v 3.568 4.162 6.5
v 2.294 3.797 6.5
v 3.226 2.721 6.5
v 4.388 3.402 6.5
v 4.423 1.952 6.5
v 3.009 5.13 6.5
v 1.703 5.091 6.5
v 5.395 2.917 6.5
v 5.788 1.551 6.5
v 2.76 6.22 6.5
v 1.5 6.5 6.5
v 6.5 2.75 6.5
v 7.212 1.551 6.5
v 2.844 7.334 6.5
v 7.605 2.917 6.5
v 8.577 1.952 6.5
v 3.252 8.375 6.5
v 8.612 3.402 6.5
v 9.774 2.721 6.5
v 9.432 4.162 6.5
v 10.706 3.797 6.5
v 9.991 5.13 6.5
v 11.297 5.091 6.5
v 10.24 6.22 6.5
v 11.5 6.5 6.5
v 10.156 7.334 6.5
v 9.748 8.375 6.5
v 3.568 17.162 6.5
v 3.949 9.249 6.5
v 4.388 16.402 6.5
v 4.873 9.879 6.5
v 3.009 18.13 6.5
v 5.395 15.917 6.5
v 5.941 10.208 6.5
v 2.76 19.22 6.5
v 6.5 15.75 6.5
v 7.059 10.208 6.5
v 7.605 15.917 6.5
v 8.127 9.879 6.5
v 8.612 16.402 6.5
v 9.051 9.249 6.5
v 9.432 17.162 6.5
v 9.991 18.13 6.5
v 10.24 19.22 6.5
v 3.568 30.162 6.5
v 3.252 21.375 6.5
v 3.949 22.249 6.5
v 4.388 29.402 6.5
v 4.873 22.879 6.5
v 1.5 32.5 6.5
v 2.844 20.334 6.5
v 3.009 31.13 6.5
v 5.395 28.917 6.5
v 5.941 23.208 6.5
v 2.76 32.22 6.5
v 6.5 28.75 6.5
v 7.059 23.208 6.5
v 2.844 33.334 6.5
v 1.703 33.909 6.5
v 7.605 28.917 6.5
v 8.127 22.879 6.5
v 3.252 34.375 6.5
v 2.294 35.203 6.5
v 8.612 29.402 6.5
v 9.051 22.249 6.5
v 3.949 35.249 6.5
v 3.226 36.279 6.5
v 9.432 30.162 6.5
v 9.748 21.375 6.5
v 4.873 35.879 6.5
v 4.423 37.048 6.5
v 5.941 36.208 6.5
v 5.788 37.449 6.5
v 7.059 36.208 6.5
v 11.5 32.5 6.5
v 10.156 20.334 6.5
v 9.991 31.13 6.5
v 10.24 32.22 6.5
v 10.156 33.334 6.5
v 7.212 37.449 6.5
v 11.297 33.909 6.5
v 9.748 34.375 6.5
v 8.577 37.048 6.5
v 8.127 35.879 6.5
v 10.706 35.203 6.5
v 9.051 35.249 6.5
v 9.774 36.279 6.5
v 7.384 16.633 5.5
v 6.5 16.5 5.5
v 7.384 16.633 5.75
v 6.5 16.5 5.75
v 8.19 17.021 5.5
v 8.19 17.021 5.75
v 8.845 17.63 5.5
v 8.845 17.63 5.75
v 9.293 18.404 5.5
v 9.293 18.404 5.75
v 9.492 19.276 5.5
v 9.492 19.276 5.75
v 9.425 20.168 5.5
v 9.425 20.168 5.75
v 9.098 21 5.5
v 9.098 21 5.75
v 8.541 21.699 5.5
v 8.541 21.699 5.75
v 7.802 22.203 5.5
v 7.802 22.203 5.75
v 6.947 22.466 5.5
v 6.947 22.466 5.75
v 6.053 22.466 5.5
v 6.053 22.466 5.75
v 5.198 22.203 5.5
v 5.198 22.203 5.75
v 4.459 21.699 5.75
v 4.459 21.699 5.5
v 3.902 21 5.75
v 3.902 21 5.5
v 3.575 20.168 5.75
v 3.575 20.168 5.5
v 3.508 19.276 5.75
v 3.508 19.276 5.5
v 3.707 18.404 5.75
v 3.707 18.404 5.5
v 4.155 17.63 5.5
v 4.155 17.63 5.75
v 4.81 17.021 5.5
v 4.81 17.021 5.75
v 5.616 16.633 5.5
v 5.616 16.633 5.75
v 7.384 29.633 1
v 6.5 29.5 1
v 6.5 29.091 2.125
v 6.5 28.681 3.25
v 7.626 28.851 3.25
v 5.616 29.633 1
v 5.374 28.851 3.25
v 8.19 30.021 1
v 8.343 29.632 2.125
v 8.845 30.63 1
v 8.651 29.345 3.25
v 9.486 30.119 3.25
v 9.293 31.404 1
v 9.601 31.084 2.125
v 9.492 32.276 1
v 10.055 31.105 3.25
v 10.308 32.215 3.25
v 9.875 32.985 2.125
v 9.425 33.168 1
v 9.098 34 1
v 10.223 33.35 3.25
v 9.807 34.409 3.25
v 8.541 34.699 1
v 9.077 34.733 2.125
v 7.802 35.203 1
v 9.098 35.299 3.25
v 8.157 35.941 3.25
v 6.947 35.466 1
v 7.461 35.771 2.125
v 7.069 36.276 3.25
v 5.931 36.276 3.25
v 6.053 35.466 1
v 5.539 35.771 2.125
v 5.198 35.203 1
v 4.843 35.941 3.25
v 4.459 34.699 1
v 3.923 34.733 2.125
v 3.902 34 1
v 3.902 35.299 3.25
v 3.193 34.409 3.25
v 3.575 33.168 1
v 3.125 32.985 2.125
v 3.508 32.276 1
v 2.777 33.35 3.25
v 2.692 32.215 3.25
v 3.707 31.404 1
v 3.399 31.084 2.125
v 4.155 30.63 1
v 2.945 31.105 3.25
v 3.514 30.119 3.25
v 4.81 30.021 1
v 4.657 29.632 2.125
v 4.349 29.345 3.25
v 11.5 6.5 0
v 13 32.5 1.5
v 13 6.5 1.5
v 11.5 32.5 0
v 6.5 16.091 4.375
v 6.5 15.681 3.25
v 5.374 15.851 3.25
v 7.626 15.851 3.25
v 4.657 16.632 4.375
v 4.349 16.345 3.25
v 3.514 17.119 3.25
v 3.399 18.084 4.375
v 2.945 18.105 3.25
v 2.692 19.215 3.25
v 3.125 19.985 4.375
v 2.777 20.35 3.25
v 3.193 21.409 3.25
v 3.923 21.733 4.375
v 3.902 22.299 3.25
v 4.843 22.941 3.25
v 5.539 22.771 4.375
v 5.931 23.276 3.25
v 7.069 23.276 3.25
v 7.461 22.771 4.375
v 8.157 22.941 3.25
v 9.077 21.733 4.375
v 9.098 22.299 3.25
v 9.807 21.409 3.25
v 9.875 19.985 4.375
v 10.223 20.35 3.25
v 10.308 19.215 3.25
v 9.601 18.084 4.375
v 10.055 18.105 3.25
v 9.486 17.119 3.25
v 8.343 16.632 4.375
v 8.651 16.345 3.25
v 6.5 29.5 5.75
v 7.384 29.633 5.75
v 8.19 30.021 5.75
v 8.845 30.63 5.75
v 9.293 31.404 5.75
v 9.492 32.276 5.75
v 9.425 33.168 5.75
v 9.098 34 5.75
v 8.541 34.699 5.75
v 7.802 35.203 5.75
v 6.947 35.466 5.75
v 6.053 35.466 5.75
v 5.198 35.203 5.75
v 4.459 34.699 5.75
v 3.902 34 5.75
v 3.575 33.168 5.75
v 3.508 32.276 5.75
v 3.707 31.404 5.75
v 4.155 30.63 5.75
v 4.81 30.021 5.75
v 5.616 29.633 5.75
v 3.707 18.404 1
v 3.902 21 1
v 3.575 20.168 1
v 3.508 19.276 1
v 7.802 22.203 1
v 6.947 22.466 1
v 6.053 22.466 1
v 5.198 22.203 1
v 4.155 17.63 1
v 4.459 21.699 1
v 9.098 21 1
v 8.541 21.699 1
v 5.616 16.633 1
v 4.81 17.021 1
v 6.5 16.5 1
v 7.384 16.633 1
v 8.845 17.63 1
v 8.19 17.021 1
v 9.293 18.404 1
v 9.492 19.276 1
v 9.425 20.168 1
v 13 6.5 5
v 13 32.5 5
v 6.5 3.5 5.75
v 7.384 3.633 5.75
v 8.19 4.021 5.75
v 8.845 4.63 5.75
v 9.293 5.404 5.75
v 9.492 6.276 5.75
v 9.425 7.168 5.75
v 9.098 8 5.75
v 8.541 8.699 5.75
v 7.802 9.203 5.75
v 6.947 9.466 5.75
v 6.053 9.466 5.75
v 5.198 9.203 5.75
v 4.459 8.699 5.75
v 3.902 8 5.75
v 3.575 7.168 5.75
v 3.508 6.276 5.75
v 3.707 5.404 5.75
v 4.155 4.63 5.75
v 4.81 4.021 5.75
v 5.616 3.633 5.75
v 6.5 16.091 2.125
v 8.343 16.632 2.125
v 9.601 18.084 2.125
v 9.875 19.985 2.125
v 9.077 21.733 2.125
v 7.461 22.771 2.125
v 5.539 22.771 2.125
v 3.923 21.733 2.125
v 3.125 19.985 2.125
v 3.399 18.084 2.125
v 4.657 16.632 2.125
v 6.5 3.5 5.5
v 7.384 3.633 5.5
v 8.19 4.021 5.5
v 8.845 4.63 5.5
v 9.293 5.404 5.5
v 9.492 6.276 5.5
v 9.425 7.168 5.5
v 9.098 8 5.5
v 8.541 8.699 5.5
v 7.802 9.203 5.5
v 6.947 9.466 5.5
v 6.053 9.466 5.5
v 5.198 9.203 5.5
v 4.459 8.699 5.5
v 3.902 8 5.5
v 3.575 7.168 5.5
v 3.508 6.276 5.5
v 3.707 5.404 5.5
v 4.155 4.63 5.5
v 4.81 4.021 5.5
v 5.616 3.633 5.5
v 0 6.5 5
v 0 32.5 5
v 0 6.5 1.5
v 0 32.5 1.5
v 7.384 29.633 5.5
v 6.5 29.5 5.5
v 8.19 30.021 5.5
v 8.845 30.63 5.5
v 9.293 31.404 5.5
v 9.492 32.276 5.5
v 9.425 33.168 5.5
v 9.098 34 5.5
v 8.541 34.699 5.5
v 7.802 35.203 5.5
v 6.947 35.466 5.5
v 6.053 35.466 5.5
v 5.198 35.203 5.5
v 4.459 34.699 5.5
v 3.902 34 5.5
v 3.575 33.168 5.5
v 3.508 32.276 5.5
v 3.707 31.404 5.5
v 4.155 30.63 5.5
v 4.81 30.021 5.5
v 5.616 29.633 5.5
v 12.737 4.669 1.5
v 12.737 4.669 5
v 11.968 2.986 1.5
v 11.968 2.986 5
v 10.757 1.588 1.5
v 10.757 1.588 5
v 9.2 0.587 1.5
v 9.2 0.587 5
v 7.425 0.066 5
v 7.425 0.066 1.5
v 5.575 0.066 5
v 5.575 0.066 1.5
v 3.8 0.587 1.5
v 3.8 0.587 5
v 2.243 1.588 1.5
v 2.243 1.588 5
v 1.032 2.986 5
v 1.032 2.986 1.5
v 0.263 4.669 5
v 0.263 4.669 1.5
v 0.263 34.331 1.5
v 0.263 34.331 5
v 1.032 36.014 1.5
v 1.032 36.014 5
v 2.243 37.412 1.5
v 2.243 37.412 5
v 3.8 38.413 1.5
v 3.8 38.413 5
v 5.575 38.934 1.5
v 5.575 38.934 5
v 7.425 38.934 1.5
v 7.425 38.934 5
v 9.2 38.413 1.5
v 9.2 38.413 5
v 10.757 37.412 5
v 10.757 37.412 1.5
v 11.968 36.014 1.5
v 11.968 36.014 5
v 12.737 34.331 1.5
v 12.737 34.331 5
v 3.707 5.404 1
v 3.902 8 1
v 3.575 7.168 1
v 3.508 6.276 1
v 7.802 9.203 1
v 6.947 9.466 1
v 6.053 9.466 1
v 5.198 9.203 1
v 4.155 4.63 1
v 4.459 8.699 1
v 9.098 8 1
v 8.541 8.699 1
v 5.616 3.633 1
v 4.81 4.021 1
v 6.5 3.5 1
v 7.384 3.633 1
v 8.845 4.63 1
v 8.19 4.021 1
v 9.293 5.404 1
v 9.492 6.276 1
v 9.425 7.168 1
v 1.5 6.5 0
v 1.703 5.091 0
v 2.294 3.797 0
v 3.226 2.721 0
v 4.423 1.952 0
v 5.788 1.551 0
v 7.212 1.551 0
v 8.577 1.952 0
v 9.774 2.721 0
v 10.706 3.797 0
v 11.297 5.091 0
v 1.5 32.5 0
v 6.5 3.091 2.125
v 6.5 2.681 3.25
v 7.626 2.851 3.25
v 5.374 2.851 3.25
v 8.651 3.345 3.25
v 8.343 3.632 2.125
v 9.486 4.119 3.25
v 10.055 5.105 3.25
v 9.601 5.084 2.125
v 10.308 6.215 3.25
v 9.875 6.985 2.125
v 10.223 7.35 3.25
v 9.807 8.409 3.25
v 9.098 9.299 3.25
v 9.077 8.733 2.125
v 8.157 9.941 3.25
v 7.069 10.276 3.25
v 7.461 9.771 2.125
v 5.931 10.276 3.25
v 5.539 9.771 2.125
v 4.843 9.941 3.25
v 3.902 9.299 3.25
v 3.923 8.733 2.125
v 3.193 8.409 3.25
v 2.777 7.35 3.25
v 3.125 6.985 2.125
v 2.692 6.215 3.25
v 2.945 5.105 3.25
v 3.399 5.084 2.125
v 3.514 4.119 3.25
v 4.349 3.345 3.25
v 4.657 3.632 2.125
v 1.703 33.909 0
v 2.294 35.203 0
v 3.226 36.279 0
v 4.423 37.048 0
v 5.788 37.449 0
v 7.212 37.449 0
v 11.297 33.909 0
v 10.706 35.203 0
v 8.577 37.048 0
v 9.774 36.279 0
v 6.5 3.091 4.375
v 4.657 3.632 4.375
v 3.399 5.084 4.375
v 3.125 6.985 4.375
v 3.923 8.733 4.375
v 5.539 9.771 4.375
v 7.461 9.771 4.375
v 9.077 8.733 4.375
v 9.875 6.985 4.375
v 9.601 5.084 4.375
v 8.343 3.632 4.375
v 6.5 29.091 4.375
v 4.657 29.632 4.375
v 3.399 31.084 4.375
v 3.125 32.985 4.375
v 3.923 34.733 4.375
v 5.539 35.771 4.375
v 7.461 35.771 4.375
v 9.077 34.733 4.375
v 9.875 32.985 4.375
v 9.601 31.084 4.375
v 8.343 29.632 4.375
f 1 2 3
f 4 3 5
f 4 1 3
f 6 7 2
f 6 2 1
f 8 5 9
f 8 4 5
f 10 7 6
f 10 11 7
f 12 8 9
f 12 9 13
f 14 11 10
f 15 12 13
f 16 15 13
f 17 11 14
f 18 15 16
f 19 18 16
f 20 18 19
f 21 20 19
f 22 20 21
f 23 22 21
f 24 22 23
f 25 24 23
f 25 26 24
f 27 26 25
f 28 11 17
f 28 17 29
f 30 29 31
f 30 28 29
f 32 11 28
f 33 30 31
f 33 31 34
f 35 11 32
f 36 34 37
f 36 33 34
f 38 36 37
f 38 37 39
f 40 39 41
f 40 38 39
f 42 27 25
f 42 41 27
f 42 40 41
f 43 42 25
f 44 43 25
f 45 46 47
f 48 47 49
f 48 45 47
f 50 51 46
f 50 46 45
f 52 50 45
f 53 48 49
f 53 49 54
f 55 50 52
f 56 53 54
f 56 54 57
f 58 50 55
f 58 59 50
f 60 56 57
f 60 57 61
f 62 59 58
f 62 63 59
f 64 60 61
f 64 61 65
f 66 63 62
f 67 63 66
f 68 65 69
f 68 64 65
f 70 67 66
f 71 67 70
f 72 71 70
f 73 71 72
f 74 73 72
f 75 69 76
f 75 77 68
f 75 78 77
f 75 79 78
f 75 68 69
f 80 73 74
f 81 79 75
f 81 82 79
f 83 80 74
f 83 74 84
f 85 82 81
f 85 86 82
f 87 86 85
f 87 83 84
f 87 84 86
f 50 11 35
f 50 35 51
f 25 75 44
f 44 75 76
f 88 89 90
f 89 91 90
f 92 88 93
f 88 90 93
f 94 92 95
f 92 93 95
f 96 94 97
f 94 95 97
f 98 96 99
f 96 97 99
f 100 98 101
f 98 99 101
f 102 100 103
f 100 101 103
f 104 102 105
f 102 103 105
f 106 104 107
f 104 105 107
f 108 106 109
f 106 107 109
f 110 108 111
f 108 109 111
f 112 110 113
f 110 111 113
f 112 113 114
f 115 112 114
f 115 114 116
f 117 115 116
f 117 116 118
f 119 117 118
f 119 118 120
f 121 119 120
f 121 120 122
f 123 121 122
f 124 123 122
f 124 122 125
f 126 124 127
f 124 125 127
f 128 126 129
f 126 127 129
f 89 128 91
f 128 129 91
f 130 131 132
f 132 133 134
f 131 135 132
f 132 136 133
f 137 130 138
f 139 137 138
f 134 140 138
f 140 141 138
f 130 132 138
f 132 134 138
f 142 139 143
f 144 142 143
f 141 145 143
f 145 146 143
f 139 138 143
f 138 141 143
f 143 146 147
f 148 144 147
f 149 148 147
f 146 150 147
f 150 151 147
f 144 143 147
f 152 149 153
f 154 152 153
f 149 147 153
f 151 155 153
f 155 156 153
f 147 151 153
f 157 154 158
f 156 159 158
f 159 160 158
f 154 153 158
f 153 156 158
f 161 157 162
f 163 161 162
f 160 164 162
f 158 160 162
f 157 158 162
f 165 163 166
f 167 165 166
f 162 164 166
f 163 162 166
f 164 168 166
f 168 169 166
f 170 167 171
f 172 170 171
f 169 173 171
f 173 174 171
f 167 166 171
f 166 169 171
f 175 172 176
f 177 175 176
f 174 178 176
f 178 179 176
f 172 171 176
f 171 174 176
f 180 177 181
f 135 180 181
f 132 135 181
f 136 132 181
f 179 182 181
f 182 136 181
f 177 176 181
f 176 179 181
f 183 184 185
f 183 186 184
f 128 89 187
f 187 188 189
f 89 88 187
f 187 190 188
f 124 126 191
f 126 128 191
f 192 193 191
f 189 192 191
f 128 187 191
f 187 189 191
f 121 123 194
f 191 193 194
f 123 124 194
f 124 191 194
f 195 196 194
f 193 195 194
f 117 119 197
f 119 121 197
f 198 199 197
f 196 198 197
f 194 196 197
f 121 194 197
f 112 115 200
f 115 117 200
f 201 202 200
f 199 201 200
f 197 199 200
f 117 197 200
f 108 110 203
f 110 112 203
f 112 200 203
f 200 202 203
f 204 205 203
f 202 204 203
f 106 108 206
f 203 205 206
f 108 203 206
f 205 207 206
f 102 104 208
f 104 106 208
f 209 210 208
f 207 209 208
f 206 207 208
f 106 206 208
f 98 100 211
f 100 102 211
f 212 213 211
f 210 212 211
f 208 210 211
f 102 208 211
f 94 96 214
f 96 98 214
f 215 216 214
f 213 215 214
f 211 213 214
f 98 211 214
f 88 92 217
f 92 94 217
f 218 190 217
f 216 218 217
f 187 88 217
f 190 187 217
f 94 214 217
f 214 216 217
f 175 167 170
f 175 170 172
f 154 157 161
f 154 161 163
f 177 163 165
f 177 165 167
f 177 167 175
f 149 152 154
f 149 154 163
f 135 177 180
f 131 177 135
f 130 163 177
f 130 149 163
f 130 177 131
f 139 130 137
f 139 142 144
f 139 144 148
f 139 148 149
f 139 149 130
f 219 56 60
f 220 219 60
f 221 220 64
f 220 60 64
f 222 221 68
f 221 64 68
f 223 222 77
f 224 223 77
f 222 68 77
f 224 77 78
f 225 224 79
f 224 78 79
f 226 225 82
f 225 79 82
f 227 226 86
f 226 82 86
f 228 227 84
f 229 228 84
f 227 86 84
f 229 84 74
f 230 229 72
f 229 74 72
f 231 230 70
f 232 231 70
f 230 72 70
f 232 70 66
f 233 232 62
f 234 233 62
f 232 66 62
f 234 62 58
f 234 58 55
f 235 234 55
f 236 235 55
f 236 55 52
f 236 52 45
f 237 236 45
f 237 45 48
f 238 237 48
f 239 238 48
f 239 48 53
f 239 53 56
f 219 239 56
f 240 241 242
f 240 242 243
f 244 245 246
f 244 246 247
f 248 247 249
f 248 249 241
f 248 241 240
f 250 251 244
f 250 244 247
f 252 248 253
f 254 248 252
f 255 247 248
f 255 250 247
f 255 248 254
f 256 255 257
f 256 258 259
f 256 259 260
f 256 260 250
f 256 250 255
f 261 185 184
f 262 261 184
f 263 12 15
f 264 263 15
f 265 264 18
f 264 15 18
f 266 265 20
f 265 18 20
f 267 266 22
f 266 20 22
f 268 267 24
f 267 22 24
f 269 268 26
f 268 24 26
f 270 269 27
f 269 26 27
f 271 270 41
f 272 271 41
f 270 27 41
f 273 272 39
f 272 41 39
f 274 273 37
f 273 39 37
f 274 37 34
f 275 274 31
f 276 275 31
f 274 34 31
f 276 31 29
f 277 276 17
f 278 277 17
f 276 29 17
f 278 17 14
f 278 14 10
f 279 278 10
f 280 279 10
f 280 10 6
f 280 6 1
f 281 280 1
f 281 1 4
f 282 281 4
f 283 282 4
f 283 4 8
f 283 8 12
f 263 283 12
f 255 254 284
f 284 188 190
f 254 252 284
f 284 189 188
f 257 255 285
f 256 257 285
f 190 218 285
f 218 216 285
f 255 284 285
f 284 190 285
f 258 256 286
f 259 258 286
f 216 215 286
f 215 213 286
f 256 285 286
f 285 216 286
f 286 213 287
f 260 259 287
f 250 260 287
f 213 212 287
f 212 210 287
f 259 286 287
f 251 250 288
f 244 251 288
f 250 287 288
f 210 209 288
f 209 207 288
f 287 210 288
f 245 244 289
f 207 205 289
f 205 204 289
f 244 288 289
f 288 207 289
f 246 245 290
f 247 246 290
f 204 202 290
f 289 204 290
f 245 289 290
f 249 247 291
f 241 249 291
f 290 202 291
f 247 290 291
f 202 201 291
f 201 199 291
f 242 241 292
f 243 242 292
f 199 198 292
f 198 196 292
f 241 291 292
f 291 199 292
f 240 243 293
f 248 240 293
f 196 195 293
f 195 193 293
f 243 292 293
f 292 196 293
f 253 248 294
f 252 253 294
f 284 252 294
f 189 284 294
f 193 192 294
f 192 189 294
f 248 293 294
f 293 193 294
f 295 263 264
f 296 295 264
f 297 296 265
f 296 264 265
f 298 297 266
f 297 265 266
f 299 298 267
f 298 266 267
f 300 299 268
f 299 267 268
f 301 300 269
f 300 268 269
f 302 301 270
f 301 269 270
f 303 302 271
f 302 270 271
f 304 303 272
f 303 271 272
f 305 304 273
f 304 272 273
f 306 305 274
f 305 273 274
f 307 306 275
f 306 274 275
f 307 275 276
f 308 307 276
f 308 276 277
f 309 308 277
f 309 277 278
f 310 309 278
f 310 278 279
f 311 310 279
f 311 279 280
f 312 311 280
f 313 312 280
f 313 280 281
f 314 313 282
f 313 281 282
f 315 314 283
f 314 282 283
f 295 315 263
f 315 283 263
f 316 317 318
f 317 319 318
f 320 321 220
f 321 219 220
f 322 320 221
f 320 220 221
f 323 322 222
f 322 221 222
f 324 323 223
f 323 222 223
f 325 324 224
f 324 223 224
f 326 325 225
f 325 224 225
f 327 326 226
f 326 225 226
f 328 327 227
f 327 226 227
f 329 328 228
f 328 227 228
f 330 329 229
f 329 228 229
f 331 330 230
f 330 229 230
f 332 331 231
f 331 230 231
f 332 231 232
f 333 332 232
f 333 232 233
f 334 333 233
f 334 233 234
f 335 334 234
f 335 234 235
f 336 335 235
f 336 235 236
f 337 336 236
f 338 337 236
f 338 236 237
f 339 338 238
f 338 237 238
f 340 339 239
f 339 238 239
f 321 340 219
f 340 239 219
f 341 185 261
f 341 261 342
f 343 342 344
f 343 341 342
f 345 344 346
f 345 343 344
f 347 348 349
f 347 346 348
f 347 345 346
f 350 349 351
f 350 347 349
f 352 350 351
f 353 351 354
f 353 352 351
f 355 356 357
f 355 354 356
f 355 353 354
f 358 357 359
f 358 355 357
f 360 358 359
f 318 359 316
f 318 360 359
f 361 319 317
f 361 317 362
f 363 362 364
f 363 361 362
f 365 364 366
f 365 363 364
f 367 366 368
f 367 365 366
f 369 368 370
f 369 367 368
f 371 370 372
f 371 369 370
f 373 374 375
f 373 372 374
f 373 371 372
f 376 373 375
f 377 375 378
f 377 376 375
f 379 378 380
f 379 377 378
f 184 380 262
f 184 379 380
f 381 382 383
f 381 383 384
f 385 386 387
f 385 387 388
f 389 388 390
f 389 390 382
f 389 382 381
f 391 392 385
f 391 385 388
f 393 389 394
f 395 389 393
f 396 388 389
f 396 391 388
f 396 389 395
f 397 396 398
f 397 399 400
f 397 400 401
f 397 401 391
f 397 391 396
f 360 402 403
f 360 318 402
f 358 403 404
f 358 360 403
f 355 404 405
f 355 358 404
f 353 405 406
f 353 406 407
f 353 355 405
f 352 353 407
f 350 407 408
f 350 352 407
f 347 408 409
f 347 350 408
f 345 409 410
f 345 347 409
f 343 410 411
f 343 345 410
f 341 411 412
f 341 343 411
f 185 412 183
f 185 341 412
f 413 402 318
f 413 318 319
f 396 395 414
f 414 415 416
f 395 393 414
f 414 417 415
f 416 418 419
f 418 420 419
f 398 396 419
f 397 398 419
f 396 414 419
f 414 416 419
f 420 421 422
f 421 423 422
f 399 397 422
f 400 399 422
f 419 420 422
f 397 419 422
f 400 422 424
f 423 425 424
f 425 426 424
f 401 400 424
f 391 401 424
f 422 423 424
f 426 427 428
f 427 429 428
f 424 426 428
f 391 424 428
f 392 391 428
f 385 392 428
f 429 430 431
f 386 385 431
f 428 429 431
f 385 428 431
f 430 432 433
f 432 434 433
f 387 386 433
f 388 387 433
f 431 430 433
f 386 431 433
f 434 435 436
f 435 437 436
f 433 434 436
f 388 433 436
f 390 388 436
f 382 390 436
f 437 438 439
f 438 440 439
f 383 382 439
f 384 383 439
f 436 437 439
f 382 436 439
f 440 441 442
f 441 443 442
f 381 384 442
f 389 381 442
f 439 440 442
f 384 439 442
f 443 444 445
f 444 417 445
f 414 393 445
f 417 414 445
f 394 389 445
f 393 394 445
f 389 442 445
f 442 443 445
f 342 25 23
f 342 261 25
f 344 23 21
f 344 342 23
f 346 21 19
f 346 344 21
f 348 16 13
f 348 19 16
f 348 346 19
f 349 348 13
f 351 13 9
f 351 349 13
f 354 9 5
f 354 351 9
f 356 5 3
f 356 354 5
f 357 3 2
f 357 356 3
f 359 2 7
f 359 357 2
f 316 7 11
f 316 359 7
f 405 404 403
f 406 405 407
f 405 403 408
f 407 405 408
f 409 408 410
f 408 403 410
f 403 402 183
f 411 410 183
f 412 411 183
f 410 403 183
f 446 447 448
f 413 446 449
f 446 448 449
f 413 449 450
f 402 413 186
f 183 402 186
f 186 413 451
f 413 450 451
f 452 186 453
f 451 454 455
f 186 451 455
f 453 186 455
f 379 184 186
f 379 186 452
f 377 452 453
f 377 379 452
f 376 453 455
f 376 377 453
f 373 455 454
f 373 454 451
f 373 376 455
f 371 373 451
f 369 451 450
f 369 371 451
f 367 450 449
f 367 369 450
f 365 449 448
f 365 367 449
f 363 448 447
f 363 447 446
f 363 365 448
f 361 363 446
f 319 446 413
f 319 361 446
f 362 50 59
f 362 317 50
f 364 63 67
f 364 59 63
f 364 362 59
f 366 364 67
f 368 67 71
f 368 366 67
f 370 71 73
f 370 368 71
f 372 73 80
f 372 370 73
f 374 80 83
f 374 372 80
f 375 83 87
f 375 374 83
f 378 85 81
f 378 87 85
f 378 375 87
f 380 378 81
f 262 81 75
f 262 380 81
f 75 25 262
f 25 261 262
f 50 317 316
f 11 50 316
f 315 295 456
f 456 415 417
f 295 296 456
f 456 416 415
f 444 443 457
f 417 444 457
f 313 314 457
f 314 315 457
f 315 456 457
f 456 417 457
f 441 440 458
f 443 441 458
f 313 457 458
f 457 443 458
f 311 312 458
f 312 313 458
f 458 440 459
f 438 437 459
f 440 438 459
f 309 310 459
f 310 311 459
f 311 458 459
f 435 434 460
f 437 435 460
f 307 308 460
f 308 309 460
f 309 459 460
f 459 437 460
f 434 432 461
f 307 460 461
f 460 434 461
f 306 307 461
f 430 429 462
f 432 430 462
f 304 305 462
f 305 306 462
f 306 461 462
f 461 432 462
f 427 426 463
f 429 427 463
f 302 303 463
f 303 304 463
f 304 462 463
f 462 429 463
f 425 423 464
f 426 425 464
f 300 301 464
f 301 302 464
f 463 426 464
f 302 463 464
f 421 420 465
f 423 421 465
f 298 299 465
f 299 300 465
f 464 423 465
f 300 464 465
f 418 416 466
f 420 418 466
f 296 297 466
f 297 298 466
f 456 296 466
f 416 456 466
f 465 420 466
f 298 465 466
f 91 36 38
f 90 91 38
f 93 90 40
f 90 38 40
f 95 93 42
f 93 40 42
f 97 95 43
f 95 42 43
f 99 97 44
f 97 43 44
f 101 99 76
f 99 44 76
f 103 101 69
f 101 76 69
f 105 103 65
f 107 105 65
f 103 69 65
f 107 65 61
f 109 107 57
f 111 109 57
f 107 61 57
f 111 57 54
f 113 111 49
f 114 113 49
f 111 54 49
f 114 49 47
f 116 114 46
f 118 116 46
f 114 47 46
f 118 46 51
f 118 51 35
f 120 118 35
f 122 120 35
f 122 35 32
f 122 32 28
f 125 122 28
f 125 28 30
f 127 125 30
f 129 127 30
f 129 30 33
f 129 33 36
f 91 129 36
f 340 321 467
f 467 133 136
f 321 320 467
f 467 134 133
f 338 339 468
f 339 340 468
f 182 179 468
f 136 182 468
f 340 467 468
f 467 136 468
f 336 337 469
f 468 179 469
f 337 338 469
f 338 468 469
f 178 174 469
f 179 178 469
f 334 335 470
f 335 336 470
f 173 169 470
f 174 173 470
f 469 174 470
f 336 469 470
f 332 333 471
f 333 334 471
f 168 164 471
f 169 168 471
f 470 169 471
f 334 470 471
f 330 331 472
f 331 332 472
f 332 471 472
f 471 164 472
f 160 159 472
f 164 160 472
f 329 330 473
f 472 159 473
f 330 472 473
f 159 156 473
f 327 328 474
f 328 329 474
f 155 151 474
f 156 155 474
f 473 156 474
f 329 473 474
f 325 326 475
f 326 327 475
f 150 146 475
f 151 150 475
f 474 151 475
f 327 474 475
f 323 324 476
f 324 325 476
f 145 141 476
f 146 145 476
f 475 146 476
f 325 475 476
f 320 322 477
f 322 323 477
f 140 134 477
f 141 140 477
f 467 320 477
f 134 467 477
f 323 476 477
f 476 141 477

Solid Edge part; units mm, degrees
sketch "Sketch1" plane through (0, 0, 0) normal (0, 0, 1) x (1, 0, 0)
  line L0 (0, 32.5) -> (0, 6.5)
  line L1 (13, 6.5) -> (13, 32.5)
  arc A0 (13, 6.5) -> (0, 6.5) centre (6.5, 6.5) cw
  arc A1 (0, 32.5) -> (13, 32.5) centre (6.5, 32.5) cw
extrude "Protrusion1" add sketch "Sketch1" along normal blind 6.5
sketch "Sketch2" plane through (6.5, 0, 0) normal (1, 0, 0) x (0, 1, 0)
  line L0 (3.5, 5.5) -> (3.5, 6.5)
  line L1 (3.5, 6.5) -> (6.5, 6.5)
  line L2 (6.5, 1) -> (6.5, 6.5)
  line L3 (3.5, 1) -> (6.5, 1)
  line L4 (3.5, 1) -> (2.6811, 3.25)
  line L5 (3.5, 5.5) -> (2.6811, 3.25)
revolve "RevolvedCutout1" cut sketch "Sketch2" angle 360 about axis through (6.5, 6.5, 1) along (0, 0, 1)
chamfer "Chaflán_38" distance 0.75 angle 45 1 edges at (6.5, 3.5, 6.5)
pattern_linear "Pattern1" count 3 spacing 13 along (0, 1, 0) of "RevolvedCutout1", "Chaflán_38"
chamfer "Chaflán_39" distance 1.5 angle 45 8 edges at (13, 19.5, 6.5) (6.5, 0, 6.5) (0, 19.5, 6.5) (6.5, 39, 6.5) (13, 19.5, 0) (6.5, 0, 0) (0, 19.5, 0) (6.5, 39, 0)
